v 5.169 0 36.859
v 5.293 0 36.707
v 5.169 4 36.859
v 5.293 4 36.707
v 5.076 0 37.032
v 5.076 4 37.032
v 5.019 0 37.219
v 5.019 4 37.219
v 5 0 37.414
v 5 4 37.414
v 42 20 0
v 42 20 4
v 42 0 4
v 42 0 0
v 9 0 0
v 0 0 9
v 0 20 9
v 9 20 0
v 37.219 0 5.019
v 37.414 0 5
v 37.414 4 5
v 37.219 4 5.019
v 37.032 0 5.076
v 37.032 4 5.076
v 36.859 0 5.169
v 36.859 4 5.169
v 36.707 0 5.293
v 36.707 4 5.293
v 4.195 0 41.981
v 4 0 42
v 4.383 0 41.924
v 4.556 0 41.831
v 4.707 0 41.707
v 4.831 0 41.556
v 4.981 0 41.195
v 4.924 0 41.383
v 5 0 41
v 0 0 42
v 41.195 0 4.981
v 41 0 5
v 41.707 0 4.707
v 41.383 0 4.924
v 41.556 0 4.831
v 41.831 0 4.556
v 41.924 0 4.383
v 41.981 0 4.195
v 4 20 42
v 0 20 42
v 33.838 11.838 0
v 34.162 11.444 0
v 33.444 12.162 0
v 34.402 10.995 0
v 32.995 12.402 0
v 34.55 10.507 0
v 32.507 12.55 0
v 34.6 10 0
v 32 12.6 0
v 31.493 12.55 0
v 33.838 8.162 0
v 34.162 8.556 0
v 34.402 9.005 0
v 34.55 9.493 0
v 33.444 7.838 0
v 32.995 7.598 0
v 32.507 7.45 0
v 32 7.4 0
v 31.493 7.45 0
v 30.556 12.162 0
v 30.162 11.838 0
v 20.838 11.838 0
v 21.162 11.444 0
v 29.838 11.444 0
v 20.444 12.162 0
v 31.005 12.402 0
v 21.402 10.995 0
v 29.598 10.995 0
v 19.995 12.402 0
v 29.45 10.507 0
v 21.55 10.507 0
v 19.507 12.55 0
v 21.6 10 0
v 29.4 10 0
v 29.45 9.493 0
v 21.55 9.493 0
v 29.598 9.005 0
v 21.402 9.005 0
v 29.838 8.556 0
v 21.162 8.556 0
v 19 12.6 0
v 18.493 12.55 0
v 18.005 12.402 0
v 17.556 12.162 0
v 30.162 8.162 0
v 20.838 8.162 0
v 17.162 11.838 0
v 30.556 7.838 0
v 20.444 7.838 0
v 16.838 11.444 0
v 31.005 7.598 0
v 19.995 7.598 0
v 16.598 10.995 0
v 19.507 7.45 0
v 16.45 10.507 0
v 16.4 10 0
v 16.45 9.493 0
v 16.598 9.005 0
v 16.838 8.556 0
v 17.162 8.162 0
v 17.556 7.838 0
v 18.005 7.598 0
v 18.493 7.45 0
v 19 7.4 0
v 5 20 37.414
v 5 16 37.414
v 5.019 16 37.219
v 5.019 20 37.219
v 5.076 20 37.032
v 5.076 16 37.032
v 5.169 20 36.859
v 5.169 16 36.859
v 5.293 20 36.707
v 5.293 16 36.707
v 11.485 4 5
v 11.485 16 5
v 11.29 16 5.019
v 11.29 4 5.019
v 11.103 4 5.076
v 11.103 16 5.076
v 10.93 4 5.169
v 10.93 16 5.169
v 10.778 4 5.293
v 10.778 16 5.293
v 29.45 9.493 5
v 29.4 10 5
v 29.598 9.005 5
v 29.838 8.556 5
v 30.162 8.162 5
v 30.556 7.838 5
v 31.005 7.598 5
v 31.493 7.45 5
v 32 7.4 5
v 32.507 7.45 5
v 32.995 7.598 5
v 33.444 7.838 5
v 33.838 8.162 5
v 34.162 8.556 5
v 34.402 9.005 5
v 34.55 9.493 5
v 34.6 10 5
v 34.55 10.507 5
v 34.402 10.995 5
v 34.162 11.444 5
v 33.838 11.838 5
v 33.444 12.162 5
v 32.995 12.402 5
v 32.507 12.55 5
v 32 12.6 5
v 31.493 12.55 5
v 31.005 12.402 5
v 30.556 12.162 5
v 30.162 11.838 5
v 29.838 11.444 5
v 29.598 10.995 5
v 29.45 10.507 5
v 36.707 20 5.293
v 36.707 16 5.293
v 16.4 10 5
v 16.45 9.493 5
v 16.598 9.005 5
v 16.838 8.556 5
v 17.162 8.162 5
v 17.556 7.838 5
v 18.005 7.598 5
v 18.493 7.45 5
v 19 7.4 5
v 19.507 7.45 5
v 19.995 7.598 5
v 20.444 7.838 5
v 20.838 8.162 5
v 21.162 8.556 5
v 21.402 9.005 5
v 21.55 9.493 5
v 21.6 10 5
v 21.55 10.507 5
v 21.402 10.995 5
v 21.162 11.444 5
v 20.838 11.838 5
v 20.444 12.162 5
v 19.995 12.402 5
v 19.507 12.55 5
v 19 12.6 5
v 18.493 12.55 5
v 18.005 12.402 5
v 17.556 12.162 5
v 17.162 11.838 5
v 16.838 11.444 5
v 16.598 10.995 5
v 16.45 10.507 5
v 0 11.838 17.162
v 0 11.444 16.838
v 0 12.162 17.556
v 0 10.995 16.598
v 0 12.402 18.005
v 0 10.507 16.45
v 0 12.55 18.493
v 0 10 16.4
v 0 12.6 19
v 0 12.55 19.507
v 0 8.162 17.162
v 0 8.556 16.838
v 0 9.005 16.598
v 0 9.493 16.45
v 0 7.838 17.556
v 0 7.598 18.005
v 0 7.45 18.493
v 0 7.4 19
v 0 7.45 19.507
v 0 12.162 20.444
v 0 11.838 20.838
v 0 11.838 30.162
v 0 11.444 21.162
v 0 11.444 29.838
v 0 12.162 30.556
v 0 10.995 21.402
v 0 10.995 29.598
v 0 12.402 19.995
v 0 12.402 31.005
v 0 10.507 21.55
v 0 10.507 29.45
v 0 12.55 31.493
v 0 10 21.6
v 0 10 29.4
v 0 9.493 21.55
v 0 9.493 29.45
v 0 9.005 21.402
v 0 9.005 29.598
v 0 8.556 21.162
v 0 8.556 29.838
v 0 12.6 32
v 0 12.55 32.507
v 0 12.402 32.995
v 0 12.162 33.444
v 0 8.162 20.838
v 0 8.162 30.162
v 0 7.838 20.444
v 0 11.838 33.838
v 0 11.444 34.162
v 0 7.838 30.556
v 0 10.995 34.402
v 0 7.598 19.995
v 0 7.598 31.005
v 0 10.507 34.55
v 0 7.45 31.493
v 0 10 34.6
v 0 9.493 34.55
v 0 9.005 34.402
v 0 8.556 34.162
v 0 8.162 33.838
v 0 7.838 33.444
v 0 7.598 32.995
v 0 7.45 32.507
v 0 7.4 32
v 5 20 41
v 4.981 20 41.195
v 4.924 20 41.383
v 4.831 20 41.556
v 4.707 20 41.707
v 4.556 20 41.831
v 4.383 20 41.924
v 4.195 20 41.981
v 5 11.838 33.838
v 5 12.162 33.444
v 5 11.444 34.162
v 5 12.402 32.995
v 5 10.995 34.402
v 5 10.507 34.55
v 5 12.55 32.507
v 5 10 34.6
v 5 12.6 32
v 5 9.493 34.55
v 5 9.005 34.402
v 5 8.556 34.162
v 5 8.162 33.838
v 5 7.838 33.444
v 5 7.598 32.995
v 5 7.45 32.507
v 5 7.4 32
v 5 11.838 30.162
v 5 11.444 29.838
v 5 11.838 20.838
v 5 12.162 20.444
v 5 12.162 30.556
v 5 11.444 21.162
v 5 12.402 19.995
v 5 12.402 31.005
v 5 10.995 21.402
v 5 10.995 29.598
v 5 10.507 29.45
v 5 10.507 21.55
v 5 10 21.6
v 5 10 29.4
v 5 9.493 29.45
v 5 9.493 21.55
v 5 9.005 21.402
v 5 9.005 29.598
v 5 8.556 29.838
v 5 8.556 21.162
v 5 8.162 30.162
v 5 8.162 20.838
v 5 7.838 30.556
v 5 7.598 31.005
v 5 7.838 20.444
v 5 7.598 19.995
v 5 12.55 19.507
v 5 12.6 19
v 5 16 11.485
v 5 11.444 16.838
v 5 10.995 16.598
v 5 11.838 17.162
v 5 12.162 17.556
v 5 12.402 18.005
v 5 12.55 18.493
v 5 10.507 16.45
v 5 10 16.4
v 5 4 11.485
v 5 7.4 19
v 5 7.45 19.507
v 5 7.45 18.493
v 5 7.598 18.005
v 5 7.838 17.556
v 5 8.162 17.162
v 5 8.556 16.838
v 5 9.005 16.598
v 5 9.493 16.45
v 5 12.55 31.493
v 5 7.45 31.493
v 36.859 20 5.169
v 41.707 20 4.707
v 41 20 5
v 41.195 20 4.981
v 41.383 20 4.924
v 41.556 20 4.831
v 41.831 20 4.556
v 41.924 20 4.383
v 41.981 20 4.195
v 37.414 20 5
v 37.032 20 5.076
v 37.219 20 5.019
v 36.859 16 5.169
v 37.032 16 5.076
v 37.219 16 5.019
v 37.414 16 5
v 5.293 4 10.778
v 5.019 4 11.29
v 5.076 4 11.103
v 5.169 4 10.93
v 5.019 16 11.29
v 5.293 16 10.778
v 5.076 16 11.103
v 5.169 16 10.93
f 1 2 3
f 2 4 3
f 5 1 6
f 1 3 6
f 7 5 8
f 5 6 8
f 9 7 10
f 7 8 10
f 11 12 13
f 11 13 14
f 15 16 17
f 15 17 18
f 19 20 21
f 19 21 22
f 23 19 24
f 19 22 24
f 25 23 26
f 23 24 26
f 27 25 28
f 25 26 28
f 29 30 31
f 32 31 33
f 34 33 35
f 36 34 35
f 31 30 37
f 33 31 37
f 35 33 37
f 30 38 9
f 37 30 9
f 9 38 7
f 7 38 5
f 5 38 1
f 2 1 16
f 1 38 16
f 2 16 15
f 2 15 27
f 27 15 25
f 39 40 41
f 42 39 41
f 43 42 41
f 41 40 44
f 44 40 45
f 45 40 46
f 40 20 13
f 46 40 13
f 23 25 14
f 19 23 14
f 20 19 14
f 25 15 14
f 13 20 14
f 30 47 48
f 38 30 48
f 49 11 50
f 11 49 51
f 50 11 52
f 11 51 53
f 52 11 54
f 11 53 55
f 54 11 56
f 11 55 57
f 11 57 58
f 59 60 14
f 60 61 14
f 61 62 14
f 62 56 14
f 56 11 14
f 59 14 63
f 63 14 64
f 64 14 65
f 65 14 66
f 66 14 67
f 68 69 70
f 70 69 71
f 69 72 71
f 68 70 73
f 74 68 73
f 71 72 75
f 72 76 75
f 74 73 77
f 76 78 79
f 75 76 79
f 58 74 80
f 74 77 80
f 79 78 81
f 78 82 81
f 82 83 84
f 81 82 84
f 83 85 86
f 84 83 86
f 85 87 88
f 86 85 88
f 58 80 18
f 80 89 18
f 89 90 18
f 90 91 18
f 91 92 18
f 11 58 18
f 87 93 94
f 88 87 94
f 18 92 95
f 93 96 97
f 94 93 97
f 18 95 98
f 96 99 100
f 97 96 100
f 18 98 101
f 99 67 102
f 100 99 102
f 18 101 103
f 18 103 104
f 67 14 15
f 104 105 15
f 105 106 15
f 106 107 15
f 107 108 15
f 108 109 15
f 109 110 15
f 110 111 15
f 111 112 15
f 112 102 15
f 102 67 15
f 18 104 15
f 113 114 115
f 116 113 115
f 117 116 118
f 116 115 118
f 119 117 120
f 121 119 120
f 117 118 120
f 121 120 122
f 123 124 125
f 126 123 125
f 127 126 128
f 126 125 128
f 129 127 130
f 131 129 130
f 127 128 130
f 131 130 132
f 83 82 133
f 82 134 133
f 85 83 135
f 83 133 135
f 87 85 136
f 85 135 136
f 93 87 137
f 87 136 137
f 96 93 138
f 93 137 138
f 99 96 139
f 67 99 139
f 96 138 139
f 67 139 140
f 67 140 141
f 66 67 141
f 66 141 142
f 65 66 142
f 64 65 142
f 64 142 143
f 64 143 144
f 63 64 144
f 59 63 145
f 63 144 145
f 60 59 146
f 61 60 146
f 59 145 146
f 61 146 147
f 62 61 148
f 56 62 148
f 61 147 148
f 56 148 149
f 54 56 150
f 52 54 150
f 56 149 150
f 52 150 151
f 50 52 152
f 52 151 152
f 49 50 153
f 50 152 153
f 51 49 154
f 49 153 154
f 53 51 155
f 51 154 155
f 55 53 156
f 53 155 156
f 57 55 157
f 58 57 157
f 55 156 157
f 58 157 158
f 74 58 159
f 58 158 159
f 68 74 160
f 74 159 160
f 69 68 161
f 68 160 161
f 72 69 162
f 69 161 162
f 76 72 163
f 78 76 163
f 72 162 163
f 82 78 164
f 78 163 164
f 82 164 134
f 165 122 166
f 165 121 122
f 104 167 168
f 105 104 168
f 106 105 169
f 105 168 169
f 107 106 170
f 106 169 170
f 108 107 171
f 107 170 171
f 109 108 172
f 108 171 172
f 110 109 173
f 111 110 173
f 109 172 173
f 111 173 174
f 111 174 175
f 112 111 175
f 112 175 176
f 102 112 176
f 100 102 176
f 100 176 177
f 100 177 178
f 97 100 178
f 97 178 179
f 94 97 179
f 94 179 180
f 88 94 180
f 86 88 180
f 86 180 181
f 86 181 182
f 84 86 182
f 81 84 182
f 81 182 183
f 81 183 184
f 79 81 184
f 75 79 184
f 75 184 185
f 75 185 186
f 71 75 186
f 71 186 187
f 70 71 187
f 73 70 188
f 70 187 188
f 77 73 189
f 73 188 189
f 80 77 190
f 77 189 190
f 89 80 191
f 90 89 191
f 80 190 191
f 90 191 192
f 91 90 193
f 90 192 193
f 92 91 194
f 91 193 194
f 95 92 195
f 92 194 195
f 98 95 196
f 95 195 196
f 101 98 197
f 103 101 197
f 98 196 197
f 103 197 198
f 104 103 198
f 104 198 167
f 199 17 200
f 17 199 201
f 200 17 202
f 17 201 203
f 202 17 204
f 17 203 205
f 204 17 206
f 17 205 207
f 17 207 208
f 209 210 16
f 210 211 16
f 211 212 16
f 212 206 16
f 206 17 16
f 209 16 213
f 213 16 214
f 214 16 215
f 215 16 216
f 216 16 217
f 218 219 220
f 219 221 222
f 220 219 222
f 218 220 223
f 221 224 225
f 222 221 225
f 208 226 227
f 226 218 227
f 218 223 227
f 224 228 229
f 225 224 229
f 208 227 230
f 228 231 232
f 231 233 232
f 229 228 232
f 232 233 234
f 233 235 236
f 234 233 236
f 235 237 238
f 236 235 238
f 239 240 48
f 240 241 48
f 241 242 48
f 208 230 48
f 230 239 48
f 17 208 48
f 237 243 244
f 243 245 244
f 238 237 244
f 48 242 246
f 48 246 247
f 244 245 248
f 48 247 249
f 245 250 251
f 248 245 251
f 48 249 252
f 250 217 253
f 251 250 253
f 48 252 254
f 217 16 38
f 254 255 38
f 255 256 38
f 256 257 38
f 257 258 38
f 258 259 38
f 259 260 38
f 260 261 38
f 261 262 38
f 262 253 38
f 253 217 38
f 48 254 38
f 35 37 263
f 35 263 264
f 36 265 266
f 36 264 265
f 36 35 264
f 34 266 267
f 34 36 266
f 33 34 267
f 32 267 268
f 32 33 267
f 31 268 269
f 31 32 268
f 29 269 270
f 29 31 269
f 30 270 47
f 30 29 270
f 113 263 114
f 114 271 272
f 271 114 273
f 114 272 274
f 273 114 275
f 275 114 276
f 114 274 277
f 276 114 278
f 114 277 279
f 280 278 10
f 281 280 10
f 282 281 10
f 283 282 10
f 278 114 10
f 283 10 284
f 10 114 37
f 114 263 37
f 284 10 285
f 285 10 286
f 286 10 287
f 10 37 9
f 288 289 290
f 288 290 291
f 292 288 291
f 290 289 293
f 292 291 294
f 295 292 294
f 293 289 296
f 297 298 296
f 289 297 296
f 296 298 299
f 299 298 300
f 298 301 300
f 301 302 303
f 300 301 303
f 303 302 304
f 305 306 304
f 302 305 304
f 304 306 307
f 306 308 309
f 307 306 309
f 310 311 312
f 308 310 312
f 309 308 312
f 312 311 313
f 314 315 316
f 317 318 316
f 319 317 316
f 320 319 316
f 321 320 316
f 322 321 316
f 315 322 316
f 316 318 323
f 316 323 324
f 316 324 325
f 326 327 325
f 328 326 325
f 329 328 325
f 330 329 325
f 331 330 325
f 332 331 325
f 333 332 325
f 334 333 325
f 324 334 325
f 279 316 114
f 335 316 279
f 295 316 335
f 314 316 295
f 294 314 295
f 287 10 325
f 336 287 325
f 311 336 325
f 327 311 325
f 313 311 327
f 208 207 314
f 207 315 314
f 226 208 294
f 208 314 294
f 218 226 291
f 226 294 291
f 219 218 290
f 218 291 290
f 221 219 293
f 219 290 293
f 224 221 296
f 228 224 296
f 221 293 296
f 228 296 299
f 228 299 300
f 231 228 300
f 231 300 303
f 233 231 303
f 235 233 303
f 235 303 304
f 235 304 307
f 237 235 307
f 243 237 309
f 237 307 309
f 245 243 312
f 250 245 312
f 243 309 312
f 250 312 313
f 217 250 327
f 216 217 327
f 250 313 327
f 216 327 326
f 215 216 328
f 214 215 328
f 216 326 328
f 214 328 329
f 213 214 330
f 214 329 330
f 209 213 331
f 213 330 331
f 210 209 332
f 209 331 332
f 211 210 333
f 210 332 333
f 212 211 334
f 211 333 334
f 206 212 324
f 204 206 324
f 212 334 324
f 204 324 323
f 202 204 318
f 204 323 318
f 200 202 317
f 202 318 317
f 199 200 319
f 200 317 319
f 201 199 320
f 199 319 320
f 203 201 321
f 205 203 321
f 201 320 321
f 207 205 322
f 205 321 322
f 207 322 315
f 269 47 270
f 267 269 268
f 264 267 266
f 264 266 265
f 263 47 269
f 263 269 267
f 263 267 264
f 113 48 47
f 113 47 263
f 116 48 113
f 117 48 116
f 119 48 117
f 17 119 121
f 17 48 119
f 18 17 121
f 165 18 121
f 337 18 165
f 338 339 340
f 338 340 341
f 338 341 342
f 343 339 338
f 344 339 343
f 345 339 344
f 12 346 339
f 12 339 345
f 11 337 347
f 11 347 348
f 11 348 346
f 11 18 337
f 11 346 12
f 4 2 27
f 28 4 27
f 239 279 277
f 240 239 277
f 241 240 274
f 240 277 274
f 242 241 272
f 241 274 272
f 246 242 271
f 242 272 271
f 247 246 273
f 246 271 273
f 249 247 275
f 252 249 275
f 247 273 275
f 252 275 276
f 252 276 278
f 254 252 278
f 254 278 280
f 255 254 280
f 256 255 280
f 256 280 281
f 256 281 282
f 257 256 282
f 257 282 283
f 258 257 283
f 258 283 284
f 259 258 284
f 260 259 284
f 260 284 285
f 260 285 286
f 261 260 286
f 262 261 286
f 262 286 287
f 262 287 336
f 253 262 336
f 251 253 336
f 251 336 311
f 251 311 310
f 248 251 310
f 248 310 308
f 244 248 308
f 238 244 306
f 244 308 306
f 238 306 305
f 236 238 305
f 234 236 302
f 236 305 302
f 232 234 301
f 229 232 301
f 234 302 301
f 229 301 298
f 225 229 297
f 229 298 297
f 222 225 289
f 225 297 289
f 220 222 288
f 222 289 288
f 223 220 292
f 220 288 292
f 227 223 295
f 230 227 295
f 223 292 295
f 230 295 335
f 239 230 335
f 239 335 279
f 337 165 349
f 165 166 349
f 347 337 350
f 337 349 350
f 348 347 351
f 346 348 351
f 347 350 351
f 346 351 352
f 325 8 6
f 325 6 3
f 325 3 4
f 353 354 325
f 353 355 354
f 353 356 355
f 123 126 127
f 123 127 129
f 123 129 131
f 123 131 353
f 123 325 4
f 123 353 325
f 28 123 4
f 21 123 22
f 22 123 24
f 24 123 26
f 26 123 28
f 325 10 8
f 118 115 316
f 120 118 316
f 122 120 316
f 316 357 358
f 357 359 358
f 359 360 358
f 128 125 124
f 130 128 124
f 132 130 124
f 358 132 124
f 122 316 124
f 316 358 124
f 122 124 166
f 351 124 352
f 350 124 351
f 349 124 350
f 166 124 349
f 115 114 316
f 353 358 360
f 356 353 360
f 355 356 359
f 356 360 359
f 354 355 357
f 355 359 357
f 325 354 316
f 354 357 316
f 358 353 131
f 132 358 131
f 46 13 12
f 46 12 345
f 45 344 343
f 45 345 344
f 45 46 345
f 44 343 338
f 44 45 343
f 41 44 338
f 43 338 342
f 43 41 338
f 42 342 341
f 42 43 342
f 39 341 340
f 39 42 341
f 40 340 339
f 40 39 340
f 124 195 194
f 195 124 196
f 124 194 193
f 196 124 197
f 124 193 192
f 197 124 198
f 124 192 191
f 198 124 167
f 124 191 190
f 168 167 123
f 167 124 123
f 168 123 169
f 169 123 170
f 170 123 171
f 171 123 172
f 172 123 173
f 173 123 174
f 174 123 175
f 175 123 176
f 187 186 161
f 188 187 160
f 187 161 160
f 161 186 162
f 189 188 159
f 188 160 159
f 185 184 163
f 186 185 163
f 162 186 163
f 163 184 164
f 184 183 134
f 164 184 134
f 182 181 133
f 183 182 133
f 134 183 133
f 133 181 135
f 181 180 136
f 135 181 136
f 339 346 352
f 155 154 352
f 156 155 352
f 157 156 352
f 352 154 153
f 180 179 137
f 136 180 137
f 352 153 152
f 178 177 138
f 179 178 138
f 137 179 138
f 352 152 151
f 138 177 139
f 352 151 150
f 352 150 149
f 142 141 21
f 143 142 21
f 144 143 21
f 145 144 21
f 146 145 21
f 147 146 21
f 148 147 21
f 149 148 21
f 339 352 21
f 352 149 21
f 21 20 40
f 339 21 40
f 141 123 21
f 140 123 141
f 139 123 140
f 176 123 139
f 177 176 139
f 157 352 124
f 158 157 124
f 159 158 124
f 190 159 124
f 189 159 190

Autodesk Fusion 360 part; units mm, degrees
sketch "Sketch5" plane through (0, 0, 0) normal (0, 1, 0) x (1, 0, 0)
  line L0 (0, -9) -> (0, -42)
  line L1 (5, -41) -> (5, -37)
  line L2 (4, -42) -> (0, -42)
  line L3 (5, -37) -> (37, -5)
  line L4 (37, -5) -> (41, -5)
  line L5 (42, -4) -> (42, 0)
  arc A0 (4, -42) -> (5, -41) centre (4, -41) ccw
  arc A1 (41, -5) -> (42, -4) centre (41, -4) ccw
  line L6 (0, -9) -> (9, 0)
  line L7 (42, 0) -> (9, 0)
  line L8 (5, -37) -> (5, -11.0711)
  line L9 (5, -11.0711) -> (11.0711, -5)
  line L10 (11.0711, -5) -> (37, -5)
  point P0 (5, -42)
  point P1 (42, -5)
  dimension "d59" = 5
  dimension "d60" = 5
  dimension "d61" = 1
  dimension "d65" = 5
  dimension "d89" = 135
  dimension "d90" = 42
  dimension "d91" = 42
  dimension "d92" = 5
  dimension "d93" = 9
extrude "Extrude14" add sketch "Sketch5" along normal blind 4
extrude "Extrude15" add sketch "Sketch5" along normal blind 20 contours L0 L1 L2 L4 L5 A0 A1 L6 L7 L8 L9 L10
extrude "Extrude16" add sketch "Sketch5" against normal blind 4 from surface at 20
sketch "Sketch6" plane through (0, 0, 5) normal (0, 0, 1) x (-1, 0, 0)
  line L0 (-37, -16) -> (-11.0711, -16)
  line L1 (-11.0711, -16) -> (-11.0711, -4)
  line L2 (-11.0711, -4) -> (-37, -4)
  circle A0 centre (-19, -10) radius 2.5
  circle A1 centre (-32, -10) radius 2.5
  line L3 (-42, 0) -> (-42, -20)
  line L4 (-37, -20) -> (-5, -20)
  line L5 (-37, -4) -> (-37, 0)
  line L6 (-37, 0) -> (-41, 0)
  line L7 (-41, 0) -> (-41, -20)
  line L8 (-41, -20) -> (-37, -20)
  line L9 (-37, -20) -> (-37, -16)
  dimension "d71" = 5
  dimension "d72" = 10
  dimension "d73" = 13
  dimension "d74" = 10
sketch "Sketch7" plane through (5, 0, 0) normal (1, 0, 0) x (0, 1, 0)
  line L0 (20, 41) -> (0, 41)
  line L1 (0, 41) -> (0, 37)
  line L2 (0, 37) -> (4, 37)
  line L3 (4, 37) -> (4, 11.0711)
  line L4 (4, 11.0711) -> (16, 11.0711)
  line L5 (16, 11.0711) -> (16, 37)
  line L6 (16, 37) -> (20, 37)
  line L7 (20, 37) -> (20, 41)
  circle A0 centre (10, 32) radius 2.5
  circle A1 centre (10, 19) radius 2.5
  line L8 (0, 42) -> (20, 42)
  line L9 (0, 37) -> (0, 5)
  dimension "d75" = 5
  dimension "d76" = 10
  dimension "d77" = 13
  dimension "d78" = 10
extrude "Extrude17" cut sketch "Sketch7" against normal through all contours A0 | A1
extrude "Extrude18" cut sketch "Sketch6" against normal through all contours A0 | A1
fillet "Fillet5" radius 1 2 edges at (5, 10, 11.0711) (11.0711, 10, 5)
fillet "Fillet6" radius 1 4 edges at (37, 2, 5) (5, 2, 37) (5, 18, 37) (37, 18, 5)
sketch "Sketch8" plane through (0, 0, 0) normal (0, 0, -1) x (1, 0, 0)
  line L0 (42, -20) -> (42, 0)
  line L1 (42, 0) -> (9, 0)
  line L2 (9, 0) -> (9, -20)
  line L3 (9, -20) -> (42, -20)
  line L4 (42, -10) -> (9, -10) construction
  line L5 (42, -6.925) -> (38, -6.925)
  line L6 (38, -6.925) -> (38, -13.075)
  line L7 (38, -13.075) -> (42, -13.075)
  line L8 (42, -13.075) -> (42, -6.925)
  circle A0 centre (19, -10) radius 2.5
  circle A1 centre (32, -10) radius 2.5
  dimension "d87" = 6.15
  dimension "d88" = 4
sketch "Sketch9" plane through (0, 0, 0) normal (-1, 0, 0) x (0, -1, 0)
  circle A0 centre (-10, 32) radius 2.5
  circle A1 centre (-10, 19) radius 2.5
  line L0 (-20, 9) -> (0, 9)
  line L1 (0, 9) -> (0, 42)
  line L2 (0, 42) -> (-20, 42)
  line L3 (-20, 42) -> (-20, 9)
  line L4 (-13.075, 42) -> (-6.925, 42)
  line L5 (-6.925, 42) -> (-6.925, 38)
  line L6 (-6.925, 38) -> (-13.075, 38)
  line L7 (-13.075, 38) -> (-13.075, 42)
  line L8 (-10, 42) -> (-10, 9) construction
  dimension "d98" = 6.15
  dimension "d99" = 4
sketch "Sketch10" plane through (5, 0, 0) normal (1, 0, 0) x (0, 1, 0)
  line L0 (16, 37.4142) -> (20, 37.4142)
  line L1 (20, 37.4142) -> (20, 41)
  line L2 (20, 41) -> (0, 41)
  line L3 (0, 41) -> (0, 37.4142)
  line L4 (0, 37.4142) -> (4, 37.4142)
  line L5 (4, 37.4142) -> (4, 11.4853)
  line L6 (4, 11.4853) -> (16, 11.4853)
  line L7 (16, 11.4853) -> (16, 37.4142)
  circle A0 centre (10, 32) radius 2.5
  circle A1 centre (10, 19) radius 2.5
  circle A2 centre (10, 32) radius 2.6
  circle A3 centre (10, 19) radius 2.6
  dimension "d104" = 5.2
  dimension "d105" = 5.2
extrude "Extrude21" cut sketch "Sketch10" against normal through all contours A0 | A1 | A2 | A3
sketch "Sketch11" plane through (0, 0, 5) normal (0, 0, 1) x (-1, 0, 0)
  circle A0 centre (-32, -10) radius 2.5
  circle A1 centre (-19, -10) radius 2.5
  line L0 (-37.4142, -20) -> (-37.4142, -16)
  line L1 (-37.4142, -16) -> (-11.4853, -16)
  line L2 (-11.4853, -16) -> (-11.4853, -4)
  line L3 (-11.4853, -4) -> (-37.4142, -4)
  line L4 (-37.4142, -4) -> (-37.4142, 0)
  line L5 (-37.4142, 0) -> (-41, 0)
  line L6 (-41, 0) -> (-41, -20)
  line L7 (-41, -20) -> (-37.4142, -20)
  circle A2 centre (-19, -10) radius 2.6
  circle A3 centre (-32, -10) radius 2.6
  dimension "d107" = 5.2
  dimension "d108" = 5.2
extrude "Extrude22" cut sketch "Sketch11" against normal through all contours A0 | A1 | A2 | A3
